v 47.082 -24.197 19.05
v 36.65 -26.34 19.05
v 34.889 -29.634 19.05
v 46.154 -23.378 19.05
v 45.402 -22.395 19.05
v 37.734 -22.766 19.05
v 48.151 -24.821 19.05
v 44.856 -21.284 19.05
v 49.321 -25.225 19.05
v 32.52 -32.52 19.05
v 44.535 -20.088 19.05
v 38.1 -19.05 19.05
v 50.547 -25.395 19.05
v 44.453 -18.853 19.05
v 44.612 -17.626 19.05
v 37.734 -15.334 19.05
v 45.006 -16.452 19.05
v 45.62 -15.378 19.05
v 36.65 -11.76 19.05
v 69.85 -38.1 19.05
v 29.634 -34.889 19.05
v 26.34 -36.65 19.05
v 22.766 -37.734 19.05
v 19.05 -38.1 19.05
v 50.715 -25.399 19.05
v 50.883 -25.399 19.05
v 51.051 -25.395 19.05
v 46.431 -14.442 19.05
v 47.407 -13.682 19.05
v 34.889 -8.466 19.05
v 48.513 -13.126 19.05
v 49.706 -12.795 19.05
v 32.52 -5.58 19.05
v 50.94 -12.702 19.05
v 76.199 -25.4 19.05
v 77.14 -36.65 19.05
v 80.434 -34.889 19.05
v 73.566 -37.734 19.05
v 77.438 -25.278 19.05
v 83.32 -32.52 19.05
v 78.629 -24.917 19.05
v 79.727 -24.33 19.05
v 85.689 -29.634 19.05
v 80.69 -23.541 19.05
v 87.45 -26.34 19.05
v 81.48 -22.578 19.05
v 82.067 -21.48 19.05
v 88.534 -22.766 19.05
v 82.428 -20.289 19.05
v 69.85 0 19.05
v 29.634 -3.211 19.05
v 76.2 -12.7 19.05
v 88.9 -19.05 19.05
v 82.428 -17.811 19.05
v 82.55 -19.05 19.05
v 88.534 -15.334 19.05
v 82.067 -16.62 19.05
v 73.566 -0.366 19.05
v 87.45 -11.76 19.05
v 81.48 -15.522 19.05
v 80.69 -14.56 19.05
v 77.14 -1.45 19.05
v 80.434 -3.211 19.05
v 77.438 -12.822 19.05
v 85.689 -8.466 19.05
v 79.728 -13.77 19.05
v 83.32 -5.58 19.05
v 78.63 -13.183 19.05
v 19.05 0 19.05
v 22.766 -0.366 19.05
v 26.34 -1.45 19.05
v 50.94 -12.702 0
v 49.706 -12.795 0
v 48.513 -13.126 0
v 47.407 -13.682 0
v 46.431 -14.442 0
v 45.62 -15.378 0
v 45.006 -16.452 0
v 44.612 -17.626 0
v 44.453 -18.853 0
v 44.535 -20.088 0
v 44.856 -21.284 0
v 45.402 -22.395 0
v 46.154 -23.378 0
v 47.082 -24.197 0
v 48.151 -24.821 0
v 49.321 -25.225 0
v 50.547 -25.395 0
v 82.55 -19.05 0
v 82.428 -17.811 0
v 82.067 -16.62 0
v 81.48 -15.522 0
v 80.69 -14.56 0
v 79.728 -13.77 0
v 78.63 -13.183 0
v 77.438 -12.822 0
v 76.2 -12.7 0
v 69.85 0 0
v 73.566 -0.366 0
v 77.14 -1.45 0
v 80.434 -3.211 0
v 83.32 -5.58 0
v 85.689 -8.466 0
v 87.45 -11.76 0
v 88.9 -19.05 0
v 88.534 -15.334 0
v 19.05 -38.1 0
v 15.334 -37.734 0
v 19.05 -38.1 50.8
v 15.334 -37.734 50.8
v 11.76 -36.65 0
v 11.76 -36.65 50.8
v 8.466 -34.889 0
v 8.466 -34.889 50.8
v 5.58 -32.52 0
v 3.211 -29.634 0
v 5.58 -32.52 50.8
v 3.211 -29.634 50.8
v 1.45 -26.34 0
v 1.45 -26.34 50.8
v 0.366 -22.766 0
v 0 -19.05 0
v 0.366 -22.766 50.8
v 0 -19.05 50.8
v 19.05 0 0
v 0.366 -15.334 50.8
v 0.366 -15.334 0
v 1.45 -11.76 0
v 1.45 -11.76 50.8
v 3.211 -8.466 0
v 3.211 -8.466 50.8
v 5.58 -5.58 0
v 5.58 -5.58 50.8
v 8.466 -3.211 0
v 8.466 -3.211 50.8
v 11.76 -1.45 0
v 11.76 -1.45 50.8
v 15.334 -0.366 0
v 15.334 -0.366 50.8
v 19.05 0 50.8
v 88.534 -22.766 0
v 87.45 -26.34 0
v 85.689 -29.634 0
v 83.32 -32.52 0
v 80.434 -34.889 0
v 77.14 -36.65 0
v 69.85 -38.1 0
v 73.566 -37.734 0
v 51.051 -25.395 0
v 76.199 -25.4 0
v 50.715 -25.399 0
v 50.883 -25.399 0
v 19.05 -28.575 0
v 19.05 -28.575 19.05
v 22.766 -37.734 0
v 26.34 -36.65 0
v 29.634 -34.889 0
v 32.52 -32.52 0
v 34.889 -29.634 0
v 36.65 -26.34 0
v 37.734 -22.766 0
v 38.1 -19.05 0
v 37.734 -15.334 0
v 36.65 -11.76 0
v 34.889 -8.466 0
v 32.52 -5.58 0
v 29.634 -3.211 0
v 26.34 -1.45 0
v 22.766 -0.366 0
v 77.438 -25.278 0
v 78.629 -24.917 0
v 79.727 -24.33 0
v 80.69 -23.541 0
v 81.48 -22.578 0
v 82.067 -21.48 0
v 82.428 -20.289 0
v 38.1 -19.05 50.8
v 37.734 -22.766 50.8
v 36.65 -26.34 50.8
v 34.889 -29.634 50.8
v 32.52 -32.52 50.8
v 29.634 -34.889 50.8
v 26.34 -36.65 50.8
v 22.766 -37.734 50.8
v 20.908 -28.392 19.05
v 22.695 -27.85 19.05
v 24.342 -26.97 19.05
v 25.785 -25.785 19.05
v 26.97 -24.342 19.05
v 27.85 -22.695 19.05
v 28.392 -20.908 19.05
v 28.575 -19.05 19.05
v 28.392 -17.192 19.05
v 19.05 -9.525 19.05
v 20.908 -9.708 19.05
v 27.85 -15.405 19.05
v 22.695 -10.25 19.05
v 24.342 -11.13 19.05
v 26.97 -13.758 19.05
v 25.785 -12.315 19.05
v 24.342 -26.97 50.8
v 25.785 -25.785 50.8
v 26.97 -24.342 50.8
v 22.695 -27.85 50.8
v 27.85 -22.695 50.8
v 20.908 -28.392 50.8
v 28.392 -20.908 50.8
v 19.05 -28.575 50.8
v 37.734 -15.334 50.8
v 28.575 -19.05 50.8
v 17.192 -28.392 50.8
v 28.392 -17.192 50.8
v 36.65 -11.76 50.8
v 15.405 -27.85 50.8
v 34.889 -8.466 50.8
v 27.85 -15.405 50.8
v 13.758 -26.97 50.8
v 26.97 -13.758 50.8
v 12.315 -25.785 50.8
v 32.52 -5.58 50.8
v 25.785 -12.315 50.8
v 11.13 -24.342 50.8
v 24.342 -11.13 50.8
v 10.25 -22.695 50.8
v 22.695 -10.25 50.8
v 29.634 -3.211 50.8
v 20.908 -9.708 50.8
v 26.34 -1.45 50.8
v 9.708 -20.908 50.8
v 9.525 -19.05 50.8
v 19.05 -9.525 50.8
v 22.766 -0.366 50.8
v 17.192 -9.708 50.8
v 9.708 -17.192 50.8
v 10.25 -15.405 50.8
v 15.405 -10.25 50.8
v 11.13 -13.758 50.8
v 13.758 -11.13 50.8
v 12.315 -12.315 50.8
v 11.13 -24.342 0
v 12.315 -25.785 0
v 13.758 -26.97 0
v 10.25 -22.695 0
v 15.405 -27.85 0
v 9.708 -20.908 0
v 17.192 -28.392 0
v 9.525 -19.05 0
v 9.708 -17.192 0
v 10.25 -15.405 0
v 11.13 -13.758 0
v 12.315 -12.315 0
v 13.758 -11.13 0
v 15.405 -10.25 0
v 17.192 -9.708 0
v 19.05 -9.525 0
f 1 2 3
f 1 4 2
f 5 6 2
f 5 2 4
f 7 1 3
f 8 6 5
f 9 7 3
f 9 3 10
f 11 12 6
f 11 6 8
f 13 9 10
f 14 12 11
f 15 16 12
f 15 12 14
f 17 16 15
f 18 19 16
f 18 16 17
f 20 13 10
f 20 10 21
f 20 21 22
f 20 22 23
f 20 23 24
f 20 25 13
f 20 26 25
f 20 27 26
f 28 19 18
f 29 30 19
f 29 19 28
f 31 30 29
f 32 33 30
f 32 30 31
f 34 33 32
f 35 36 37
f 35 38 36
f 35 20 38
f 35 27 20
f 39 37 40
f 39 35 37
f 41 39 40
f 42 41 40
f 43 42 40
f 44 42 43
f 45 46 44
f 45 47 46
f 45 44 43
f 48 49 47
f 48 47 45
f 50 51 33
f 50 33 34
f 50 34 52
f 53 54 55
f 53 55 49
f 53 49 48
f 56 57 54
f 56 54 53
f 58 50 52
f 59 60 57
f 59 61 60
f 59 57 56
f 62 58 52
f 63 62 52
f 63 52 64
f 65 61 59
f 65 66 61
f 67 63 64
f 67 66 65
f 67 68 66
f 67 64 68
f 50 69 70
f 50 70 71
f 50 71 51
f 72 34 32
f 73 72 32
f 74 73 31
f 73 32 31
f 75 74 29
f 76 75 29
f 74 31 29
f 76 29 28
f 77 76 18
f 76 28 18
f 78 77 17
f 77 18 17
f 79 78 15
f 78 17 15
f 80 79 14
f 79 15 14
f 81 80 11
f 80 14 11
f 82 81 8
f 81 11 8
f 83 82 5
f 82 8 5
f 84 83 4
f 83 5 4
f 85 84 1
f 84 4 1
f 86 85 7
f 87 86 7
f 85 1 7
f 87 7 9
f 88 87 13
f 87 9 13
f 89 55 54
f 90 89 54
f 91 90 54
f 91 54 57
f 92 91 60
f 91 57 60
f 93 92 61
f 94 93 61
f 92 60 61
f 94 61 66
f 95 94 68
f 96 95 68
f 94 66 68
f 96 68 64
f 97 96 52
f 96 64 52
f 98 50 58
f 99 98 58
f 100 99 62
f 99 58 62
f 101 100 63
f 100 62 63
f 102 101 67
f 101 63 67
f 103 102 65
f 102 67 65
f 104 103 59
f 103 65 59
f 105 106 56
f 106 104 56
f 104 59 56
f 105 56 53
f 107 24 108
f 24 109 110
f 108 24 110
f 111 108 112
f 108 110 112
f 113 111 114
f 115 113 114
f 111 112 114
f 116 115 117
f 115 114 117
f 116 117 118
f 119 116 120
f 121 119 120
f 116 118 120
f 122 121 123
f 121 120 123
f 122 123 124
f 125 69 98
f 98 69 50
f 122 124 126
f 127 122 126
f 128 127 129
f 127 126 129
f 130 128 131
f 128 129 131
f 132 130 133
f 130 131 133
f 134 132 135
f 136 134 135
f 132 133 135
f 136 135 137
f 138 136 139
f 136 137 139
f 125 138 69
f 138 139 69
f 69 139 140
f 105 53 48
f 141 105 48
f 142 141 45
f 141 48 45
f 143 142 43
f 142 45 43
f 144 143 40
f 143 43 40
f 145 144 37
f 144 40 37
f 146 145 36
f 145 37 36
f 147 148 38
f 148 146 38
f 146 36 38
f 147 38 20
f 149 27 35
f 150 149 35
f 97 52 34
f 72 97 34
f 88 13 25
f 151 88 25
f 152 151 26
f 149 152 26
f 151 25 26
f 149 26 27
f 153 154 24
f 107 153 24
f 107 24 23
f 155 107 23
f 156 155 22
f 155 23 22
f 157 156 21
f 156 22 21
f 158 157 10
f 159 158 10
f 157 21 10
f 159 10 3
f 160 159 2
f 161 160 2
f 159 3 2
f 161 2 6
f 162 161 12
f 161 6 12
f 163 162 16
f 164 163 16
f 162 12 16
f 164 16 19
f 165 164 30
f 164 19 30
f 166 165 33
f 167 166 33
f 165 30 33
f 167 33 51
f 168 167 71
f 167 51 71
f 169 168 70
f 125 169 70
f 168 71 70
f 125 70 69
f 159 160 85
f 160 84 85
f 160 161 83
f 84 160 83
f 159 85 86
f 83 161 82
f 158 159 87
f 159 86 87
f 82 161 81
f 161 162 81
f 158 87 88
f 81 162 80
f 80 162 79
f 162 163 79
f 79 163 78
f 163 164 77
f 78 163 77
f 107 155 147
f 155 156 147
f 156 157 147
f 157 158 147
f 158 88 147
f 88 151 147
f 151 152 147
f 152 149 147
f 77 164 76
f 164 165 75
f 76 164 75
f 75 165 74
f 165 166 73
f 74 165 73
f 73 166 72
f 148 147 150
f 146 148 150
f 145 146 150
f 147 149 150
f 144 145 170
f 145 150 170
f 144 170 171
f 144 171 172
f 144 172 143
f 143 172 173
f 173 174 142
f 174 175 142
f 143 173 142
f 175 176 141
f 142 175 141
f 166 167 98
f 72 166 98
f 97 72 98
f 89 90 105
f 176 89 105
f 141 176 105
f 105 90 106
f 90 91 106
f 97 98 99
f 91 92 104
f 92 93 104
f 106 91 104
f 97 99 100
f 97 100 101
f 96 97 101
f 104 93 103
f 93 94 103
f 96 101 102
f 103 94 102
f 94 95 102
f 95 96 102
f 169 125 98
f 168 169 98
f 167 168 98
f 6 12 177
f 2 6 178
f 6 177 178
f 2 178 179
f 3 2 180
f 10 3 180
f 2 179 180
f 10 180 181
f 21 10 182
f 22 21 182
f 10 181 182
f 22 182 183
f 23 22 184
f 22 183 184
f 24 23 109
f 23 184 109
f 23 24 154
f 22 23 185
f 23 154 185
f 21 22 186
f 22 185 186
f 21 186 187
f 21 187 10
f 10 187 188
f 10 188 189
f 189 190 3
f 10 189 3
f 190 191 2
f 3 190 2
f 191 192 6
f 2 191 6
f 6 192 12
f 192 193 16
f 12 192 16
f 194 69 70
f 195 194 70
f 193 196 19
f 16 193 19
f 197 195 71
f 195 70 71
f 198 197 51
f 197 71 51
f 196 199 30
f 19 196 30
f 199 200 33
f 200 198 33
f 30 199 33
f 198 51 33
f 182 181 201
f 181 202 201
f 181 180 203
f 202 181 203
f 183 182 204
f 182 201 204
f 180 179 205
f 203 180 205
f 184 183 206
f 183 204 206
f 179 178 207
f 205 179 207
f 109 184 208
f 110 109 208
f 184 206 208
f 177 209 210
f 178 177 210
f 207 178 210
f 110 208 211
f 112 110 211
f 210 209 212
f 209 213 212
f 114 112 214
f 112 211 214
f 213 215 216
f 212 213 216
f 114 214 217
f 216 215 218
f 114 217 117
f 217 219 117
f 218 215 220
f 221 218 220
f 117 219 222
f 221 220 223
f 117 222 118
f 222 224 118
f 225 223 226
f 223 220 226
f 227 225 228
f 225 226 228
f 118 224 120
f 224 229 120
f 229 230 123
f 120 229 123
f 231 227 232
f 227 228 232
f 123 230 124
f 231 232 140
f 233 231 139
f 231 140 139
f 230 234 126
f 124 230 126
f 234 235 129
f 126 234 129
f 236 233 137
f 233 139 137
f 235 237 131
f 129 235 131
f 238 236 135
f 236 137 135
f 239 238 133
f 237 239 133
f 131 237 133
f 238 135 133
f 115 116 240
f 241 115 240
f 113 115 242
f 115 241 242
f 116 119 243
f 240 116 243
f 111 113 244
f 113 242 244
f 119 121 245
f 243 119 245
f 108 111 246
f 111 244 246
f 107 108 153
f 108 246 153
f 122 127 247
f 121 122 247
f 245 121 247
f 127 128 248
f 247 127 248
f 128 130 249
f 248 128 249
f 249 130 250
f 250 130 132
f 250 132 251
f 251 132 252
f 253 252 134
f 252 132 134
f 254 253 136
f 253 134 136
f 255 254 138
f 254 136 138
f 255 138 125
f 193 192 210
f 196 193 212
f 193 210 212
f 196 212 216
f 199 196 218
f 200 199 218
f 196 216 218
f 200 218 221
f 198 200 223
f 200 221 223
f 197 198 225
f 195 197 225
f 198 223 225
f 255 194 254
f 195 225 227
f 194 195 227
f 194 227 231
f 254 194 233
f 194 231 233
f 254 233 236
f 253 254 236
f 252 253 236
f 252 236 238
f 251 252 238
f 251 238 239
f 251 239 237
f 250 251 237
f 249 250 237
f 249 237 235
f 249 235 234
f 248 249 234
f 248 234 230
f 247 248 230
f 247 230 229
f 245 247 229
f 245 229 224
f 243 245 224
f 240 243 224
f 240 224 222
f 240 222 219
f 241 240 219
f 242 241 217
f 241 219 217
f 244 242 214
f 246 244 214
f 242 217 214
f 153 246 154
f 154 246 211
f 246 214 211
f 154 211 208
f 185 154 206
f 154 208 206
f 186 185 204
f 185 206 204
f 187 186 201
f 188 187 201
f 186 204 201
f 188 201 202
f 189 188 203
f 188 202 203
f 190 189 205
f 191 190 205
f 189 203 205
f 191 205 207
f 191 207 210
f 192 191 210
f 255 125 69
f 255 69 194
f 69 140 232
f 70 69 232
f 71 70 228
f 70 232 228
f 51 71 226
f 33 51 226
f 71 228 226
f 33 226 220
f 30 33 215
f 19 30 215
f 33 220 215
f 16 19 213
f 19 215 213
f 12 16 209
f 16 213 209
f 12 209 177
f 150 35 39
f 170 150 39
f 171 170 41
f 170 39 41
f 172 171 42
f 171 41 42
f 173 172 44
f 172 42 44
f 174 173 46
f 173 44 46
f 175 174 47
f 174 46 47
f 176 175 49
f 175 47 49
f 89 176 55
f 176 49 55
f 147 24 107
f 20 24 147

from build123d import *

# Parameters (mm, degrees)
F1_DEPTH  = 38.1
F3_DEPTH  = 50.8
F5_DEPTH  = 31.75
F7_DEPTH  = 25.4
F8_R      = 9.525
F9_DEPTH  = 63.5
F11_DEPTH = 25.4


with BuildPart() as f1:
    # F0 (on Front) → F1 (new body)
    with BuildSketch(Plane.XZ):
        Polygon((0, 50.8), (0, 0), (88.9, 0), (88.9, 19.05), (38.1, 19.05), (38.1, 50.8), align=None)
    extrude(amount=F1_DEPTH)

    # F2 (on face) → F3 (cut)
    with BuildSketch(Plane.XY.offset(50.8)):
        with BuildLine():
            ThreePointArc((19.05, -38.1), (5.579616, -32.520384), (0, -19.05))
            Line((0, -19.05), (0, -38.1))
            Line((0, -38.1), (19.05, -38.1))
        make_face()
        with BuildLine():
            ThreePointArc((0, -19.05), (5.579616, -5.579616), (19.05, 0))
            Line((19.05, 0), (0, 0))
            Line((0, 0), (0, -19.05))
        make_face()
    extrude(amount=-F3_DEPTH, mode=Mode.SUBTRACT)

    # F4 (on face) → F5 (cut)
    with BuildSketch(Plane.XY.offset(50.8)):
        with BuildLine():
            Line((38.1, -38.1), (38.1, -19.05))
            ThreePointArc((38.1, -19.05), (32.520384, -32.520384), (19.05, -38.1))
            Line((19.05, -38.1), (38.1, -38.1))
        make_face()
        with BuildLine():
            Line((38.1, 0), (19.05, 0))
            ThreePointArc((19.05, 0), (32.520384, -5.579616), (38.1, -19.05))
            Line((38.1, -19.05), (38.1, 0))
        make_face()
    extrude(amount=-F5_DEPTH, mode=Mode.SUBTRACT)

    # F6 (on face) → F7 (cut)
    with BuildSketch(Plane.XY.offset(19.05)):
        with BuildLine():
            ThreePointArc((19.05, -38.1), (38.1, -19.05), (19.05, 0))
            Line((19.05, 0), (19.05, -38.1))
        make_face()
        with BuildLine():
            Line((88.9, 0), (69.85, 0))
            ThreePointArc((69.85, 0), (83.320384, -5.579616), (88.9, -19.05))
            Line((88.9, -19.05), (88.9, 0))
        make_face()
        with BuildLine():
            ThreePointArc((88.9, -19.05), (83.320384, -32.520384), (69.85, -38.1))
            Line((69.85, -38.1), (88.9, -38.1))
            Line((88.9, -38.1), (88.9, -19.05))
        make_face()
    extrude(amount=-F7_DEPTH, mode=Mode.SUBTRACT)

    # F8 (on face) → F9 (cut)
    with BuildSketch(Plane.XY.offset(50.8)):
        with Locations((19.05, -19.05)):
            Circle(F8_R)
    extrude(amount=-F9_DEPTH, mode=Mode.SUBTRACT)

    # F10 (on face) → F11 (cut)
    with BuildSketch(Plane.XY.offset(19.05)):
        with BuildLine():
            ThreePointArc((51.050775, -25.395046), (55.377932, -23.450573), (57.15, -19.05))
            ThreePointArc((57.15, -19.05), (55.339429, -14.609721), (50.94021, -12.701548))
            ThreePointArc((50.94021, -12.701548), (44.453049, -18.85325), (50.546726, -25.394947))
            Line((50.546726, -25.394947), (51.050775, -25.395046))
        make_face()
        with BuildLine():
            ThreePointArc((50.94021, -12.701548), (55.339429, -14.609721), (57.15, -19.05))
            ThreePointArc((57.15, -19.05), (55.377932, -23.450573), (51.050775, -25.395046))
            Line((51.050775, -25.395046), (76.198749, -25.4))
            ThreePointArc((76.198749, -25.4), (69.85, -19.049569), (76.199611, -12.7))
            Line((76.199611, -12.7), (50.94021, -12.701548))
        make_face()
        with BuildLine():
            ThreePointArc((50.546726, -25.394947), (50.798749, -25.4), (51.050775, -25.395046))
            Line((51.050775, -25.395046), (50.546726, -25.394947))
        make_face()
        with BuildLine():
            ThreePointArc((82.55, -19.05), (80.68999, -14.559734), (76.199611, -12.7))
            ThreePointArc((76.199611, -12.7), (69.85, -19.049569), (76.198749, -25.4))
            ThreePointArc((76.198749, -25.4), (80.689686, -23.54057), (82.55, -19.05))
        make_face()
    extrude(amount=-F11_DEPTH, mode=Mode.SUBTRACT)


solid = f1.part
